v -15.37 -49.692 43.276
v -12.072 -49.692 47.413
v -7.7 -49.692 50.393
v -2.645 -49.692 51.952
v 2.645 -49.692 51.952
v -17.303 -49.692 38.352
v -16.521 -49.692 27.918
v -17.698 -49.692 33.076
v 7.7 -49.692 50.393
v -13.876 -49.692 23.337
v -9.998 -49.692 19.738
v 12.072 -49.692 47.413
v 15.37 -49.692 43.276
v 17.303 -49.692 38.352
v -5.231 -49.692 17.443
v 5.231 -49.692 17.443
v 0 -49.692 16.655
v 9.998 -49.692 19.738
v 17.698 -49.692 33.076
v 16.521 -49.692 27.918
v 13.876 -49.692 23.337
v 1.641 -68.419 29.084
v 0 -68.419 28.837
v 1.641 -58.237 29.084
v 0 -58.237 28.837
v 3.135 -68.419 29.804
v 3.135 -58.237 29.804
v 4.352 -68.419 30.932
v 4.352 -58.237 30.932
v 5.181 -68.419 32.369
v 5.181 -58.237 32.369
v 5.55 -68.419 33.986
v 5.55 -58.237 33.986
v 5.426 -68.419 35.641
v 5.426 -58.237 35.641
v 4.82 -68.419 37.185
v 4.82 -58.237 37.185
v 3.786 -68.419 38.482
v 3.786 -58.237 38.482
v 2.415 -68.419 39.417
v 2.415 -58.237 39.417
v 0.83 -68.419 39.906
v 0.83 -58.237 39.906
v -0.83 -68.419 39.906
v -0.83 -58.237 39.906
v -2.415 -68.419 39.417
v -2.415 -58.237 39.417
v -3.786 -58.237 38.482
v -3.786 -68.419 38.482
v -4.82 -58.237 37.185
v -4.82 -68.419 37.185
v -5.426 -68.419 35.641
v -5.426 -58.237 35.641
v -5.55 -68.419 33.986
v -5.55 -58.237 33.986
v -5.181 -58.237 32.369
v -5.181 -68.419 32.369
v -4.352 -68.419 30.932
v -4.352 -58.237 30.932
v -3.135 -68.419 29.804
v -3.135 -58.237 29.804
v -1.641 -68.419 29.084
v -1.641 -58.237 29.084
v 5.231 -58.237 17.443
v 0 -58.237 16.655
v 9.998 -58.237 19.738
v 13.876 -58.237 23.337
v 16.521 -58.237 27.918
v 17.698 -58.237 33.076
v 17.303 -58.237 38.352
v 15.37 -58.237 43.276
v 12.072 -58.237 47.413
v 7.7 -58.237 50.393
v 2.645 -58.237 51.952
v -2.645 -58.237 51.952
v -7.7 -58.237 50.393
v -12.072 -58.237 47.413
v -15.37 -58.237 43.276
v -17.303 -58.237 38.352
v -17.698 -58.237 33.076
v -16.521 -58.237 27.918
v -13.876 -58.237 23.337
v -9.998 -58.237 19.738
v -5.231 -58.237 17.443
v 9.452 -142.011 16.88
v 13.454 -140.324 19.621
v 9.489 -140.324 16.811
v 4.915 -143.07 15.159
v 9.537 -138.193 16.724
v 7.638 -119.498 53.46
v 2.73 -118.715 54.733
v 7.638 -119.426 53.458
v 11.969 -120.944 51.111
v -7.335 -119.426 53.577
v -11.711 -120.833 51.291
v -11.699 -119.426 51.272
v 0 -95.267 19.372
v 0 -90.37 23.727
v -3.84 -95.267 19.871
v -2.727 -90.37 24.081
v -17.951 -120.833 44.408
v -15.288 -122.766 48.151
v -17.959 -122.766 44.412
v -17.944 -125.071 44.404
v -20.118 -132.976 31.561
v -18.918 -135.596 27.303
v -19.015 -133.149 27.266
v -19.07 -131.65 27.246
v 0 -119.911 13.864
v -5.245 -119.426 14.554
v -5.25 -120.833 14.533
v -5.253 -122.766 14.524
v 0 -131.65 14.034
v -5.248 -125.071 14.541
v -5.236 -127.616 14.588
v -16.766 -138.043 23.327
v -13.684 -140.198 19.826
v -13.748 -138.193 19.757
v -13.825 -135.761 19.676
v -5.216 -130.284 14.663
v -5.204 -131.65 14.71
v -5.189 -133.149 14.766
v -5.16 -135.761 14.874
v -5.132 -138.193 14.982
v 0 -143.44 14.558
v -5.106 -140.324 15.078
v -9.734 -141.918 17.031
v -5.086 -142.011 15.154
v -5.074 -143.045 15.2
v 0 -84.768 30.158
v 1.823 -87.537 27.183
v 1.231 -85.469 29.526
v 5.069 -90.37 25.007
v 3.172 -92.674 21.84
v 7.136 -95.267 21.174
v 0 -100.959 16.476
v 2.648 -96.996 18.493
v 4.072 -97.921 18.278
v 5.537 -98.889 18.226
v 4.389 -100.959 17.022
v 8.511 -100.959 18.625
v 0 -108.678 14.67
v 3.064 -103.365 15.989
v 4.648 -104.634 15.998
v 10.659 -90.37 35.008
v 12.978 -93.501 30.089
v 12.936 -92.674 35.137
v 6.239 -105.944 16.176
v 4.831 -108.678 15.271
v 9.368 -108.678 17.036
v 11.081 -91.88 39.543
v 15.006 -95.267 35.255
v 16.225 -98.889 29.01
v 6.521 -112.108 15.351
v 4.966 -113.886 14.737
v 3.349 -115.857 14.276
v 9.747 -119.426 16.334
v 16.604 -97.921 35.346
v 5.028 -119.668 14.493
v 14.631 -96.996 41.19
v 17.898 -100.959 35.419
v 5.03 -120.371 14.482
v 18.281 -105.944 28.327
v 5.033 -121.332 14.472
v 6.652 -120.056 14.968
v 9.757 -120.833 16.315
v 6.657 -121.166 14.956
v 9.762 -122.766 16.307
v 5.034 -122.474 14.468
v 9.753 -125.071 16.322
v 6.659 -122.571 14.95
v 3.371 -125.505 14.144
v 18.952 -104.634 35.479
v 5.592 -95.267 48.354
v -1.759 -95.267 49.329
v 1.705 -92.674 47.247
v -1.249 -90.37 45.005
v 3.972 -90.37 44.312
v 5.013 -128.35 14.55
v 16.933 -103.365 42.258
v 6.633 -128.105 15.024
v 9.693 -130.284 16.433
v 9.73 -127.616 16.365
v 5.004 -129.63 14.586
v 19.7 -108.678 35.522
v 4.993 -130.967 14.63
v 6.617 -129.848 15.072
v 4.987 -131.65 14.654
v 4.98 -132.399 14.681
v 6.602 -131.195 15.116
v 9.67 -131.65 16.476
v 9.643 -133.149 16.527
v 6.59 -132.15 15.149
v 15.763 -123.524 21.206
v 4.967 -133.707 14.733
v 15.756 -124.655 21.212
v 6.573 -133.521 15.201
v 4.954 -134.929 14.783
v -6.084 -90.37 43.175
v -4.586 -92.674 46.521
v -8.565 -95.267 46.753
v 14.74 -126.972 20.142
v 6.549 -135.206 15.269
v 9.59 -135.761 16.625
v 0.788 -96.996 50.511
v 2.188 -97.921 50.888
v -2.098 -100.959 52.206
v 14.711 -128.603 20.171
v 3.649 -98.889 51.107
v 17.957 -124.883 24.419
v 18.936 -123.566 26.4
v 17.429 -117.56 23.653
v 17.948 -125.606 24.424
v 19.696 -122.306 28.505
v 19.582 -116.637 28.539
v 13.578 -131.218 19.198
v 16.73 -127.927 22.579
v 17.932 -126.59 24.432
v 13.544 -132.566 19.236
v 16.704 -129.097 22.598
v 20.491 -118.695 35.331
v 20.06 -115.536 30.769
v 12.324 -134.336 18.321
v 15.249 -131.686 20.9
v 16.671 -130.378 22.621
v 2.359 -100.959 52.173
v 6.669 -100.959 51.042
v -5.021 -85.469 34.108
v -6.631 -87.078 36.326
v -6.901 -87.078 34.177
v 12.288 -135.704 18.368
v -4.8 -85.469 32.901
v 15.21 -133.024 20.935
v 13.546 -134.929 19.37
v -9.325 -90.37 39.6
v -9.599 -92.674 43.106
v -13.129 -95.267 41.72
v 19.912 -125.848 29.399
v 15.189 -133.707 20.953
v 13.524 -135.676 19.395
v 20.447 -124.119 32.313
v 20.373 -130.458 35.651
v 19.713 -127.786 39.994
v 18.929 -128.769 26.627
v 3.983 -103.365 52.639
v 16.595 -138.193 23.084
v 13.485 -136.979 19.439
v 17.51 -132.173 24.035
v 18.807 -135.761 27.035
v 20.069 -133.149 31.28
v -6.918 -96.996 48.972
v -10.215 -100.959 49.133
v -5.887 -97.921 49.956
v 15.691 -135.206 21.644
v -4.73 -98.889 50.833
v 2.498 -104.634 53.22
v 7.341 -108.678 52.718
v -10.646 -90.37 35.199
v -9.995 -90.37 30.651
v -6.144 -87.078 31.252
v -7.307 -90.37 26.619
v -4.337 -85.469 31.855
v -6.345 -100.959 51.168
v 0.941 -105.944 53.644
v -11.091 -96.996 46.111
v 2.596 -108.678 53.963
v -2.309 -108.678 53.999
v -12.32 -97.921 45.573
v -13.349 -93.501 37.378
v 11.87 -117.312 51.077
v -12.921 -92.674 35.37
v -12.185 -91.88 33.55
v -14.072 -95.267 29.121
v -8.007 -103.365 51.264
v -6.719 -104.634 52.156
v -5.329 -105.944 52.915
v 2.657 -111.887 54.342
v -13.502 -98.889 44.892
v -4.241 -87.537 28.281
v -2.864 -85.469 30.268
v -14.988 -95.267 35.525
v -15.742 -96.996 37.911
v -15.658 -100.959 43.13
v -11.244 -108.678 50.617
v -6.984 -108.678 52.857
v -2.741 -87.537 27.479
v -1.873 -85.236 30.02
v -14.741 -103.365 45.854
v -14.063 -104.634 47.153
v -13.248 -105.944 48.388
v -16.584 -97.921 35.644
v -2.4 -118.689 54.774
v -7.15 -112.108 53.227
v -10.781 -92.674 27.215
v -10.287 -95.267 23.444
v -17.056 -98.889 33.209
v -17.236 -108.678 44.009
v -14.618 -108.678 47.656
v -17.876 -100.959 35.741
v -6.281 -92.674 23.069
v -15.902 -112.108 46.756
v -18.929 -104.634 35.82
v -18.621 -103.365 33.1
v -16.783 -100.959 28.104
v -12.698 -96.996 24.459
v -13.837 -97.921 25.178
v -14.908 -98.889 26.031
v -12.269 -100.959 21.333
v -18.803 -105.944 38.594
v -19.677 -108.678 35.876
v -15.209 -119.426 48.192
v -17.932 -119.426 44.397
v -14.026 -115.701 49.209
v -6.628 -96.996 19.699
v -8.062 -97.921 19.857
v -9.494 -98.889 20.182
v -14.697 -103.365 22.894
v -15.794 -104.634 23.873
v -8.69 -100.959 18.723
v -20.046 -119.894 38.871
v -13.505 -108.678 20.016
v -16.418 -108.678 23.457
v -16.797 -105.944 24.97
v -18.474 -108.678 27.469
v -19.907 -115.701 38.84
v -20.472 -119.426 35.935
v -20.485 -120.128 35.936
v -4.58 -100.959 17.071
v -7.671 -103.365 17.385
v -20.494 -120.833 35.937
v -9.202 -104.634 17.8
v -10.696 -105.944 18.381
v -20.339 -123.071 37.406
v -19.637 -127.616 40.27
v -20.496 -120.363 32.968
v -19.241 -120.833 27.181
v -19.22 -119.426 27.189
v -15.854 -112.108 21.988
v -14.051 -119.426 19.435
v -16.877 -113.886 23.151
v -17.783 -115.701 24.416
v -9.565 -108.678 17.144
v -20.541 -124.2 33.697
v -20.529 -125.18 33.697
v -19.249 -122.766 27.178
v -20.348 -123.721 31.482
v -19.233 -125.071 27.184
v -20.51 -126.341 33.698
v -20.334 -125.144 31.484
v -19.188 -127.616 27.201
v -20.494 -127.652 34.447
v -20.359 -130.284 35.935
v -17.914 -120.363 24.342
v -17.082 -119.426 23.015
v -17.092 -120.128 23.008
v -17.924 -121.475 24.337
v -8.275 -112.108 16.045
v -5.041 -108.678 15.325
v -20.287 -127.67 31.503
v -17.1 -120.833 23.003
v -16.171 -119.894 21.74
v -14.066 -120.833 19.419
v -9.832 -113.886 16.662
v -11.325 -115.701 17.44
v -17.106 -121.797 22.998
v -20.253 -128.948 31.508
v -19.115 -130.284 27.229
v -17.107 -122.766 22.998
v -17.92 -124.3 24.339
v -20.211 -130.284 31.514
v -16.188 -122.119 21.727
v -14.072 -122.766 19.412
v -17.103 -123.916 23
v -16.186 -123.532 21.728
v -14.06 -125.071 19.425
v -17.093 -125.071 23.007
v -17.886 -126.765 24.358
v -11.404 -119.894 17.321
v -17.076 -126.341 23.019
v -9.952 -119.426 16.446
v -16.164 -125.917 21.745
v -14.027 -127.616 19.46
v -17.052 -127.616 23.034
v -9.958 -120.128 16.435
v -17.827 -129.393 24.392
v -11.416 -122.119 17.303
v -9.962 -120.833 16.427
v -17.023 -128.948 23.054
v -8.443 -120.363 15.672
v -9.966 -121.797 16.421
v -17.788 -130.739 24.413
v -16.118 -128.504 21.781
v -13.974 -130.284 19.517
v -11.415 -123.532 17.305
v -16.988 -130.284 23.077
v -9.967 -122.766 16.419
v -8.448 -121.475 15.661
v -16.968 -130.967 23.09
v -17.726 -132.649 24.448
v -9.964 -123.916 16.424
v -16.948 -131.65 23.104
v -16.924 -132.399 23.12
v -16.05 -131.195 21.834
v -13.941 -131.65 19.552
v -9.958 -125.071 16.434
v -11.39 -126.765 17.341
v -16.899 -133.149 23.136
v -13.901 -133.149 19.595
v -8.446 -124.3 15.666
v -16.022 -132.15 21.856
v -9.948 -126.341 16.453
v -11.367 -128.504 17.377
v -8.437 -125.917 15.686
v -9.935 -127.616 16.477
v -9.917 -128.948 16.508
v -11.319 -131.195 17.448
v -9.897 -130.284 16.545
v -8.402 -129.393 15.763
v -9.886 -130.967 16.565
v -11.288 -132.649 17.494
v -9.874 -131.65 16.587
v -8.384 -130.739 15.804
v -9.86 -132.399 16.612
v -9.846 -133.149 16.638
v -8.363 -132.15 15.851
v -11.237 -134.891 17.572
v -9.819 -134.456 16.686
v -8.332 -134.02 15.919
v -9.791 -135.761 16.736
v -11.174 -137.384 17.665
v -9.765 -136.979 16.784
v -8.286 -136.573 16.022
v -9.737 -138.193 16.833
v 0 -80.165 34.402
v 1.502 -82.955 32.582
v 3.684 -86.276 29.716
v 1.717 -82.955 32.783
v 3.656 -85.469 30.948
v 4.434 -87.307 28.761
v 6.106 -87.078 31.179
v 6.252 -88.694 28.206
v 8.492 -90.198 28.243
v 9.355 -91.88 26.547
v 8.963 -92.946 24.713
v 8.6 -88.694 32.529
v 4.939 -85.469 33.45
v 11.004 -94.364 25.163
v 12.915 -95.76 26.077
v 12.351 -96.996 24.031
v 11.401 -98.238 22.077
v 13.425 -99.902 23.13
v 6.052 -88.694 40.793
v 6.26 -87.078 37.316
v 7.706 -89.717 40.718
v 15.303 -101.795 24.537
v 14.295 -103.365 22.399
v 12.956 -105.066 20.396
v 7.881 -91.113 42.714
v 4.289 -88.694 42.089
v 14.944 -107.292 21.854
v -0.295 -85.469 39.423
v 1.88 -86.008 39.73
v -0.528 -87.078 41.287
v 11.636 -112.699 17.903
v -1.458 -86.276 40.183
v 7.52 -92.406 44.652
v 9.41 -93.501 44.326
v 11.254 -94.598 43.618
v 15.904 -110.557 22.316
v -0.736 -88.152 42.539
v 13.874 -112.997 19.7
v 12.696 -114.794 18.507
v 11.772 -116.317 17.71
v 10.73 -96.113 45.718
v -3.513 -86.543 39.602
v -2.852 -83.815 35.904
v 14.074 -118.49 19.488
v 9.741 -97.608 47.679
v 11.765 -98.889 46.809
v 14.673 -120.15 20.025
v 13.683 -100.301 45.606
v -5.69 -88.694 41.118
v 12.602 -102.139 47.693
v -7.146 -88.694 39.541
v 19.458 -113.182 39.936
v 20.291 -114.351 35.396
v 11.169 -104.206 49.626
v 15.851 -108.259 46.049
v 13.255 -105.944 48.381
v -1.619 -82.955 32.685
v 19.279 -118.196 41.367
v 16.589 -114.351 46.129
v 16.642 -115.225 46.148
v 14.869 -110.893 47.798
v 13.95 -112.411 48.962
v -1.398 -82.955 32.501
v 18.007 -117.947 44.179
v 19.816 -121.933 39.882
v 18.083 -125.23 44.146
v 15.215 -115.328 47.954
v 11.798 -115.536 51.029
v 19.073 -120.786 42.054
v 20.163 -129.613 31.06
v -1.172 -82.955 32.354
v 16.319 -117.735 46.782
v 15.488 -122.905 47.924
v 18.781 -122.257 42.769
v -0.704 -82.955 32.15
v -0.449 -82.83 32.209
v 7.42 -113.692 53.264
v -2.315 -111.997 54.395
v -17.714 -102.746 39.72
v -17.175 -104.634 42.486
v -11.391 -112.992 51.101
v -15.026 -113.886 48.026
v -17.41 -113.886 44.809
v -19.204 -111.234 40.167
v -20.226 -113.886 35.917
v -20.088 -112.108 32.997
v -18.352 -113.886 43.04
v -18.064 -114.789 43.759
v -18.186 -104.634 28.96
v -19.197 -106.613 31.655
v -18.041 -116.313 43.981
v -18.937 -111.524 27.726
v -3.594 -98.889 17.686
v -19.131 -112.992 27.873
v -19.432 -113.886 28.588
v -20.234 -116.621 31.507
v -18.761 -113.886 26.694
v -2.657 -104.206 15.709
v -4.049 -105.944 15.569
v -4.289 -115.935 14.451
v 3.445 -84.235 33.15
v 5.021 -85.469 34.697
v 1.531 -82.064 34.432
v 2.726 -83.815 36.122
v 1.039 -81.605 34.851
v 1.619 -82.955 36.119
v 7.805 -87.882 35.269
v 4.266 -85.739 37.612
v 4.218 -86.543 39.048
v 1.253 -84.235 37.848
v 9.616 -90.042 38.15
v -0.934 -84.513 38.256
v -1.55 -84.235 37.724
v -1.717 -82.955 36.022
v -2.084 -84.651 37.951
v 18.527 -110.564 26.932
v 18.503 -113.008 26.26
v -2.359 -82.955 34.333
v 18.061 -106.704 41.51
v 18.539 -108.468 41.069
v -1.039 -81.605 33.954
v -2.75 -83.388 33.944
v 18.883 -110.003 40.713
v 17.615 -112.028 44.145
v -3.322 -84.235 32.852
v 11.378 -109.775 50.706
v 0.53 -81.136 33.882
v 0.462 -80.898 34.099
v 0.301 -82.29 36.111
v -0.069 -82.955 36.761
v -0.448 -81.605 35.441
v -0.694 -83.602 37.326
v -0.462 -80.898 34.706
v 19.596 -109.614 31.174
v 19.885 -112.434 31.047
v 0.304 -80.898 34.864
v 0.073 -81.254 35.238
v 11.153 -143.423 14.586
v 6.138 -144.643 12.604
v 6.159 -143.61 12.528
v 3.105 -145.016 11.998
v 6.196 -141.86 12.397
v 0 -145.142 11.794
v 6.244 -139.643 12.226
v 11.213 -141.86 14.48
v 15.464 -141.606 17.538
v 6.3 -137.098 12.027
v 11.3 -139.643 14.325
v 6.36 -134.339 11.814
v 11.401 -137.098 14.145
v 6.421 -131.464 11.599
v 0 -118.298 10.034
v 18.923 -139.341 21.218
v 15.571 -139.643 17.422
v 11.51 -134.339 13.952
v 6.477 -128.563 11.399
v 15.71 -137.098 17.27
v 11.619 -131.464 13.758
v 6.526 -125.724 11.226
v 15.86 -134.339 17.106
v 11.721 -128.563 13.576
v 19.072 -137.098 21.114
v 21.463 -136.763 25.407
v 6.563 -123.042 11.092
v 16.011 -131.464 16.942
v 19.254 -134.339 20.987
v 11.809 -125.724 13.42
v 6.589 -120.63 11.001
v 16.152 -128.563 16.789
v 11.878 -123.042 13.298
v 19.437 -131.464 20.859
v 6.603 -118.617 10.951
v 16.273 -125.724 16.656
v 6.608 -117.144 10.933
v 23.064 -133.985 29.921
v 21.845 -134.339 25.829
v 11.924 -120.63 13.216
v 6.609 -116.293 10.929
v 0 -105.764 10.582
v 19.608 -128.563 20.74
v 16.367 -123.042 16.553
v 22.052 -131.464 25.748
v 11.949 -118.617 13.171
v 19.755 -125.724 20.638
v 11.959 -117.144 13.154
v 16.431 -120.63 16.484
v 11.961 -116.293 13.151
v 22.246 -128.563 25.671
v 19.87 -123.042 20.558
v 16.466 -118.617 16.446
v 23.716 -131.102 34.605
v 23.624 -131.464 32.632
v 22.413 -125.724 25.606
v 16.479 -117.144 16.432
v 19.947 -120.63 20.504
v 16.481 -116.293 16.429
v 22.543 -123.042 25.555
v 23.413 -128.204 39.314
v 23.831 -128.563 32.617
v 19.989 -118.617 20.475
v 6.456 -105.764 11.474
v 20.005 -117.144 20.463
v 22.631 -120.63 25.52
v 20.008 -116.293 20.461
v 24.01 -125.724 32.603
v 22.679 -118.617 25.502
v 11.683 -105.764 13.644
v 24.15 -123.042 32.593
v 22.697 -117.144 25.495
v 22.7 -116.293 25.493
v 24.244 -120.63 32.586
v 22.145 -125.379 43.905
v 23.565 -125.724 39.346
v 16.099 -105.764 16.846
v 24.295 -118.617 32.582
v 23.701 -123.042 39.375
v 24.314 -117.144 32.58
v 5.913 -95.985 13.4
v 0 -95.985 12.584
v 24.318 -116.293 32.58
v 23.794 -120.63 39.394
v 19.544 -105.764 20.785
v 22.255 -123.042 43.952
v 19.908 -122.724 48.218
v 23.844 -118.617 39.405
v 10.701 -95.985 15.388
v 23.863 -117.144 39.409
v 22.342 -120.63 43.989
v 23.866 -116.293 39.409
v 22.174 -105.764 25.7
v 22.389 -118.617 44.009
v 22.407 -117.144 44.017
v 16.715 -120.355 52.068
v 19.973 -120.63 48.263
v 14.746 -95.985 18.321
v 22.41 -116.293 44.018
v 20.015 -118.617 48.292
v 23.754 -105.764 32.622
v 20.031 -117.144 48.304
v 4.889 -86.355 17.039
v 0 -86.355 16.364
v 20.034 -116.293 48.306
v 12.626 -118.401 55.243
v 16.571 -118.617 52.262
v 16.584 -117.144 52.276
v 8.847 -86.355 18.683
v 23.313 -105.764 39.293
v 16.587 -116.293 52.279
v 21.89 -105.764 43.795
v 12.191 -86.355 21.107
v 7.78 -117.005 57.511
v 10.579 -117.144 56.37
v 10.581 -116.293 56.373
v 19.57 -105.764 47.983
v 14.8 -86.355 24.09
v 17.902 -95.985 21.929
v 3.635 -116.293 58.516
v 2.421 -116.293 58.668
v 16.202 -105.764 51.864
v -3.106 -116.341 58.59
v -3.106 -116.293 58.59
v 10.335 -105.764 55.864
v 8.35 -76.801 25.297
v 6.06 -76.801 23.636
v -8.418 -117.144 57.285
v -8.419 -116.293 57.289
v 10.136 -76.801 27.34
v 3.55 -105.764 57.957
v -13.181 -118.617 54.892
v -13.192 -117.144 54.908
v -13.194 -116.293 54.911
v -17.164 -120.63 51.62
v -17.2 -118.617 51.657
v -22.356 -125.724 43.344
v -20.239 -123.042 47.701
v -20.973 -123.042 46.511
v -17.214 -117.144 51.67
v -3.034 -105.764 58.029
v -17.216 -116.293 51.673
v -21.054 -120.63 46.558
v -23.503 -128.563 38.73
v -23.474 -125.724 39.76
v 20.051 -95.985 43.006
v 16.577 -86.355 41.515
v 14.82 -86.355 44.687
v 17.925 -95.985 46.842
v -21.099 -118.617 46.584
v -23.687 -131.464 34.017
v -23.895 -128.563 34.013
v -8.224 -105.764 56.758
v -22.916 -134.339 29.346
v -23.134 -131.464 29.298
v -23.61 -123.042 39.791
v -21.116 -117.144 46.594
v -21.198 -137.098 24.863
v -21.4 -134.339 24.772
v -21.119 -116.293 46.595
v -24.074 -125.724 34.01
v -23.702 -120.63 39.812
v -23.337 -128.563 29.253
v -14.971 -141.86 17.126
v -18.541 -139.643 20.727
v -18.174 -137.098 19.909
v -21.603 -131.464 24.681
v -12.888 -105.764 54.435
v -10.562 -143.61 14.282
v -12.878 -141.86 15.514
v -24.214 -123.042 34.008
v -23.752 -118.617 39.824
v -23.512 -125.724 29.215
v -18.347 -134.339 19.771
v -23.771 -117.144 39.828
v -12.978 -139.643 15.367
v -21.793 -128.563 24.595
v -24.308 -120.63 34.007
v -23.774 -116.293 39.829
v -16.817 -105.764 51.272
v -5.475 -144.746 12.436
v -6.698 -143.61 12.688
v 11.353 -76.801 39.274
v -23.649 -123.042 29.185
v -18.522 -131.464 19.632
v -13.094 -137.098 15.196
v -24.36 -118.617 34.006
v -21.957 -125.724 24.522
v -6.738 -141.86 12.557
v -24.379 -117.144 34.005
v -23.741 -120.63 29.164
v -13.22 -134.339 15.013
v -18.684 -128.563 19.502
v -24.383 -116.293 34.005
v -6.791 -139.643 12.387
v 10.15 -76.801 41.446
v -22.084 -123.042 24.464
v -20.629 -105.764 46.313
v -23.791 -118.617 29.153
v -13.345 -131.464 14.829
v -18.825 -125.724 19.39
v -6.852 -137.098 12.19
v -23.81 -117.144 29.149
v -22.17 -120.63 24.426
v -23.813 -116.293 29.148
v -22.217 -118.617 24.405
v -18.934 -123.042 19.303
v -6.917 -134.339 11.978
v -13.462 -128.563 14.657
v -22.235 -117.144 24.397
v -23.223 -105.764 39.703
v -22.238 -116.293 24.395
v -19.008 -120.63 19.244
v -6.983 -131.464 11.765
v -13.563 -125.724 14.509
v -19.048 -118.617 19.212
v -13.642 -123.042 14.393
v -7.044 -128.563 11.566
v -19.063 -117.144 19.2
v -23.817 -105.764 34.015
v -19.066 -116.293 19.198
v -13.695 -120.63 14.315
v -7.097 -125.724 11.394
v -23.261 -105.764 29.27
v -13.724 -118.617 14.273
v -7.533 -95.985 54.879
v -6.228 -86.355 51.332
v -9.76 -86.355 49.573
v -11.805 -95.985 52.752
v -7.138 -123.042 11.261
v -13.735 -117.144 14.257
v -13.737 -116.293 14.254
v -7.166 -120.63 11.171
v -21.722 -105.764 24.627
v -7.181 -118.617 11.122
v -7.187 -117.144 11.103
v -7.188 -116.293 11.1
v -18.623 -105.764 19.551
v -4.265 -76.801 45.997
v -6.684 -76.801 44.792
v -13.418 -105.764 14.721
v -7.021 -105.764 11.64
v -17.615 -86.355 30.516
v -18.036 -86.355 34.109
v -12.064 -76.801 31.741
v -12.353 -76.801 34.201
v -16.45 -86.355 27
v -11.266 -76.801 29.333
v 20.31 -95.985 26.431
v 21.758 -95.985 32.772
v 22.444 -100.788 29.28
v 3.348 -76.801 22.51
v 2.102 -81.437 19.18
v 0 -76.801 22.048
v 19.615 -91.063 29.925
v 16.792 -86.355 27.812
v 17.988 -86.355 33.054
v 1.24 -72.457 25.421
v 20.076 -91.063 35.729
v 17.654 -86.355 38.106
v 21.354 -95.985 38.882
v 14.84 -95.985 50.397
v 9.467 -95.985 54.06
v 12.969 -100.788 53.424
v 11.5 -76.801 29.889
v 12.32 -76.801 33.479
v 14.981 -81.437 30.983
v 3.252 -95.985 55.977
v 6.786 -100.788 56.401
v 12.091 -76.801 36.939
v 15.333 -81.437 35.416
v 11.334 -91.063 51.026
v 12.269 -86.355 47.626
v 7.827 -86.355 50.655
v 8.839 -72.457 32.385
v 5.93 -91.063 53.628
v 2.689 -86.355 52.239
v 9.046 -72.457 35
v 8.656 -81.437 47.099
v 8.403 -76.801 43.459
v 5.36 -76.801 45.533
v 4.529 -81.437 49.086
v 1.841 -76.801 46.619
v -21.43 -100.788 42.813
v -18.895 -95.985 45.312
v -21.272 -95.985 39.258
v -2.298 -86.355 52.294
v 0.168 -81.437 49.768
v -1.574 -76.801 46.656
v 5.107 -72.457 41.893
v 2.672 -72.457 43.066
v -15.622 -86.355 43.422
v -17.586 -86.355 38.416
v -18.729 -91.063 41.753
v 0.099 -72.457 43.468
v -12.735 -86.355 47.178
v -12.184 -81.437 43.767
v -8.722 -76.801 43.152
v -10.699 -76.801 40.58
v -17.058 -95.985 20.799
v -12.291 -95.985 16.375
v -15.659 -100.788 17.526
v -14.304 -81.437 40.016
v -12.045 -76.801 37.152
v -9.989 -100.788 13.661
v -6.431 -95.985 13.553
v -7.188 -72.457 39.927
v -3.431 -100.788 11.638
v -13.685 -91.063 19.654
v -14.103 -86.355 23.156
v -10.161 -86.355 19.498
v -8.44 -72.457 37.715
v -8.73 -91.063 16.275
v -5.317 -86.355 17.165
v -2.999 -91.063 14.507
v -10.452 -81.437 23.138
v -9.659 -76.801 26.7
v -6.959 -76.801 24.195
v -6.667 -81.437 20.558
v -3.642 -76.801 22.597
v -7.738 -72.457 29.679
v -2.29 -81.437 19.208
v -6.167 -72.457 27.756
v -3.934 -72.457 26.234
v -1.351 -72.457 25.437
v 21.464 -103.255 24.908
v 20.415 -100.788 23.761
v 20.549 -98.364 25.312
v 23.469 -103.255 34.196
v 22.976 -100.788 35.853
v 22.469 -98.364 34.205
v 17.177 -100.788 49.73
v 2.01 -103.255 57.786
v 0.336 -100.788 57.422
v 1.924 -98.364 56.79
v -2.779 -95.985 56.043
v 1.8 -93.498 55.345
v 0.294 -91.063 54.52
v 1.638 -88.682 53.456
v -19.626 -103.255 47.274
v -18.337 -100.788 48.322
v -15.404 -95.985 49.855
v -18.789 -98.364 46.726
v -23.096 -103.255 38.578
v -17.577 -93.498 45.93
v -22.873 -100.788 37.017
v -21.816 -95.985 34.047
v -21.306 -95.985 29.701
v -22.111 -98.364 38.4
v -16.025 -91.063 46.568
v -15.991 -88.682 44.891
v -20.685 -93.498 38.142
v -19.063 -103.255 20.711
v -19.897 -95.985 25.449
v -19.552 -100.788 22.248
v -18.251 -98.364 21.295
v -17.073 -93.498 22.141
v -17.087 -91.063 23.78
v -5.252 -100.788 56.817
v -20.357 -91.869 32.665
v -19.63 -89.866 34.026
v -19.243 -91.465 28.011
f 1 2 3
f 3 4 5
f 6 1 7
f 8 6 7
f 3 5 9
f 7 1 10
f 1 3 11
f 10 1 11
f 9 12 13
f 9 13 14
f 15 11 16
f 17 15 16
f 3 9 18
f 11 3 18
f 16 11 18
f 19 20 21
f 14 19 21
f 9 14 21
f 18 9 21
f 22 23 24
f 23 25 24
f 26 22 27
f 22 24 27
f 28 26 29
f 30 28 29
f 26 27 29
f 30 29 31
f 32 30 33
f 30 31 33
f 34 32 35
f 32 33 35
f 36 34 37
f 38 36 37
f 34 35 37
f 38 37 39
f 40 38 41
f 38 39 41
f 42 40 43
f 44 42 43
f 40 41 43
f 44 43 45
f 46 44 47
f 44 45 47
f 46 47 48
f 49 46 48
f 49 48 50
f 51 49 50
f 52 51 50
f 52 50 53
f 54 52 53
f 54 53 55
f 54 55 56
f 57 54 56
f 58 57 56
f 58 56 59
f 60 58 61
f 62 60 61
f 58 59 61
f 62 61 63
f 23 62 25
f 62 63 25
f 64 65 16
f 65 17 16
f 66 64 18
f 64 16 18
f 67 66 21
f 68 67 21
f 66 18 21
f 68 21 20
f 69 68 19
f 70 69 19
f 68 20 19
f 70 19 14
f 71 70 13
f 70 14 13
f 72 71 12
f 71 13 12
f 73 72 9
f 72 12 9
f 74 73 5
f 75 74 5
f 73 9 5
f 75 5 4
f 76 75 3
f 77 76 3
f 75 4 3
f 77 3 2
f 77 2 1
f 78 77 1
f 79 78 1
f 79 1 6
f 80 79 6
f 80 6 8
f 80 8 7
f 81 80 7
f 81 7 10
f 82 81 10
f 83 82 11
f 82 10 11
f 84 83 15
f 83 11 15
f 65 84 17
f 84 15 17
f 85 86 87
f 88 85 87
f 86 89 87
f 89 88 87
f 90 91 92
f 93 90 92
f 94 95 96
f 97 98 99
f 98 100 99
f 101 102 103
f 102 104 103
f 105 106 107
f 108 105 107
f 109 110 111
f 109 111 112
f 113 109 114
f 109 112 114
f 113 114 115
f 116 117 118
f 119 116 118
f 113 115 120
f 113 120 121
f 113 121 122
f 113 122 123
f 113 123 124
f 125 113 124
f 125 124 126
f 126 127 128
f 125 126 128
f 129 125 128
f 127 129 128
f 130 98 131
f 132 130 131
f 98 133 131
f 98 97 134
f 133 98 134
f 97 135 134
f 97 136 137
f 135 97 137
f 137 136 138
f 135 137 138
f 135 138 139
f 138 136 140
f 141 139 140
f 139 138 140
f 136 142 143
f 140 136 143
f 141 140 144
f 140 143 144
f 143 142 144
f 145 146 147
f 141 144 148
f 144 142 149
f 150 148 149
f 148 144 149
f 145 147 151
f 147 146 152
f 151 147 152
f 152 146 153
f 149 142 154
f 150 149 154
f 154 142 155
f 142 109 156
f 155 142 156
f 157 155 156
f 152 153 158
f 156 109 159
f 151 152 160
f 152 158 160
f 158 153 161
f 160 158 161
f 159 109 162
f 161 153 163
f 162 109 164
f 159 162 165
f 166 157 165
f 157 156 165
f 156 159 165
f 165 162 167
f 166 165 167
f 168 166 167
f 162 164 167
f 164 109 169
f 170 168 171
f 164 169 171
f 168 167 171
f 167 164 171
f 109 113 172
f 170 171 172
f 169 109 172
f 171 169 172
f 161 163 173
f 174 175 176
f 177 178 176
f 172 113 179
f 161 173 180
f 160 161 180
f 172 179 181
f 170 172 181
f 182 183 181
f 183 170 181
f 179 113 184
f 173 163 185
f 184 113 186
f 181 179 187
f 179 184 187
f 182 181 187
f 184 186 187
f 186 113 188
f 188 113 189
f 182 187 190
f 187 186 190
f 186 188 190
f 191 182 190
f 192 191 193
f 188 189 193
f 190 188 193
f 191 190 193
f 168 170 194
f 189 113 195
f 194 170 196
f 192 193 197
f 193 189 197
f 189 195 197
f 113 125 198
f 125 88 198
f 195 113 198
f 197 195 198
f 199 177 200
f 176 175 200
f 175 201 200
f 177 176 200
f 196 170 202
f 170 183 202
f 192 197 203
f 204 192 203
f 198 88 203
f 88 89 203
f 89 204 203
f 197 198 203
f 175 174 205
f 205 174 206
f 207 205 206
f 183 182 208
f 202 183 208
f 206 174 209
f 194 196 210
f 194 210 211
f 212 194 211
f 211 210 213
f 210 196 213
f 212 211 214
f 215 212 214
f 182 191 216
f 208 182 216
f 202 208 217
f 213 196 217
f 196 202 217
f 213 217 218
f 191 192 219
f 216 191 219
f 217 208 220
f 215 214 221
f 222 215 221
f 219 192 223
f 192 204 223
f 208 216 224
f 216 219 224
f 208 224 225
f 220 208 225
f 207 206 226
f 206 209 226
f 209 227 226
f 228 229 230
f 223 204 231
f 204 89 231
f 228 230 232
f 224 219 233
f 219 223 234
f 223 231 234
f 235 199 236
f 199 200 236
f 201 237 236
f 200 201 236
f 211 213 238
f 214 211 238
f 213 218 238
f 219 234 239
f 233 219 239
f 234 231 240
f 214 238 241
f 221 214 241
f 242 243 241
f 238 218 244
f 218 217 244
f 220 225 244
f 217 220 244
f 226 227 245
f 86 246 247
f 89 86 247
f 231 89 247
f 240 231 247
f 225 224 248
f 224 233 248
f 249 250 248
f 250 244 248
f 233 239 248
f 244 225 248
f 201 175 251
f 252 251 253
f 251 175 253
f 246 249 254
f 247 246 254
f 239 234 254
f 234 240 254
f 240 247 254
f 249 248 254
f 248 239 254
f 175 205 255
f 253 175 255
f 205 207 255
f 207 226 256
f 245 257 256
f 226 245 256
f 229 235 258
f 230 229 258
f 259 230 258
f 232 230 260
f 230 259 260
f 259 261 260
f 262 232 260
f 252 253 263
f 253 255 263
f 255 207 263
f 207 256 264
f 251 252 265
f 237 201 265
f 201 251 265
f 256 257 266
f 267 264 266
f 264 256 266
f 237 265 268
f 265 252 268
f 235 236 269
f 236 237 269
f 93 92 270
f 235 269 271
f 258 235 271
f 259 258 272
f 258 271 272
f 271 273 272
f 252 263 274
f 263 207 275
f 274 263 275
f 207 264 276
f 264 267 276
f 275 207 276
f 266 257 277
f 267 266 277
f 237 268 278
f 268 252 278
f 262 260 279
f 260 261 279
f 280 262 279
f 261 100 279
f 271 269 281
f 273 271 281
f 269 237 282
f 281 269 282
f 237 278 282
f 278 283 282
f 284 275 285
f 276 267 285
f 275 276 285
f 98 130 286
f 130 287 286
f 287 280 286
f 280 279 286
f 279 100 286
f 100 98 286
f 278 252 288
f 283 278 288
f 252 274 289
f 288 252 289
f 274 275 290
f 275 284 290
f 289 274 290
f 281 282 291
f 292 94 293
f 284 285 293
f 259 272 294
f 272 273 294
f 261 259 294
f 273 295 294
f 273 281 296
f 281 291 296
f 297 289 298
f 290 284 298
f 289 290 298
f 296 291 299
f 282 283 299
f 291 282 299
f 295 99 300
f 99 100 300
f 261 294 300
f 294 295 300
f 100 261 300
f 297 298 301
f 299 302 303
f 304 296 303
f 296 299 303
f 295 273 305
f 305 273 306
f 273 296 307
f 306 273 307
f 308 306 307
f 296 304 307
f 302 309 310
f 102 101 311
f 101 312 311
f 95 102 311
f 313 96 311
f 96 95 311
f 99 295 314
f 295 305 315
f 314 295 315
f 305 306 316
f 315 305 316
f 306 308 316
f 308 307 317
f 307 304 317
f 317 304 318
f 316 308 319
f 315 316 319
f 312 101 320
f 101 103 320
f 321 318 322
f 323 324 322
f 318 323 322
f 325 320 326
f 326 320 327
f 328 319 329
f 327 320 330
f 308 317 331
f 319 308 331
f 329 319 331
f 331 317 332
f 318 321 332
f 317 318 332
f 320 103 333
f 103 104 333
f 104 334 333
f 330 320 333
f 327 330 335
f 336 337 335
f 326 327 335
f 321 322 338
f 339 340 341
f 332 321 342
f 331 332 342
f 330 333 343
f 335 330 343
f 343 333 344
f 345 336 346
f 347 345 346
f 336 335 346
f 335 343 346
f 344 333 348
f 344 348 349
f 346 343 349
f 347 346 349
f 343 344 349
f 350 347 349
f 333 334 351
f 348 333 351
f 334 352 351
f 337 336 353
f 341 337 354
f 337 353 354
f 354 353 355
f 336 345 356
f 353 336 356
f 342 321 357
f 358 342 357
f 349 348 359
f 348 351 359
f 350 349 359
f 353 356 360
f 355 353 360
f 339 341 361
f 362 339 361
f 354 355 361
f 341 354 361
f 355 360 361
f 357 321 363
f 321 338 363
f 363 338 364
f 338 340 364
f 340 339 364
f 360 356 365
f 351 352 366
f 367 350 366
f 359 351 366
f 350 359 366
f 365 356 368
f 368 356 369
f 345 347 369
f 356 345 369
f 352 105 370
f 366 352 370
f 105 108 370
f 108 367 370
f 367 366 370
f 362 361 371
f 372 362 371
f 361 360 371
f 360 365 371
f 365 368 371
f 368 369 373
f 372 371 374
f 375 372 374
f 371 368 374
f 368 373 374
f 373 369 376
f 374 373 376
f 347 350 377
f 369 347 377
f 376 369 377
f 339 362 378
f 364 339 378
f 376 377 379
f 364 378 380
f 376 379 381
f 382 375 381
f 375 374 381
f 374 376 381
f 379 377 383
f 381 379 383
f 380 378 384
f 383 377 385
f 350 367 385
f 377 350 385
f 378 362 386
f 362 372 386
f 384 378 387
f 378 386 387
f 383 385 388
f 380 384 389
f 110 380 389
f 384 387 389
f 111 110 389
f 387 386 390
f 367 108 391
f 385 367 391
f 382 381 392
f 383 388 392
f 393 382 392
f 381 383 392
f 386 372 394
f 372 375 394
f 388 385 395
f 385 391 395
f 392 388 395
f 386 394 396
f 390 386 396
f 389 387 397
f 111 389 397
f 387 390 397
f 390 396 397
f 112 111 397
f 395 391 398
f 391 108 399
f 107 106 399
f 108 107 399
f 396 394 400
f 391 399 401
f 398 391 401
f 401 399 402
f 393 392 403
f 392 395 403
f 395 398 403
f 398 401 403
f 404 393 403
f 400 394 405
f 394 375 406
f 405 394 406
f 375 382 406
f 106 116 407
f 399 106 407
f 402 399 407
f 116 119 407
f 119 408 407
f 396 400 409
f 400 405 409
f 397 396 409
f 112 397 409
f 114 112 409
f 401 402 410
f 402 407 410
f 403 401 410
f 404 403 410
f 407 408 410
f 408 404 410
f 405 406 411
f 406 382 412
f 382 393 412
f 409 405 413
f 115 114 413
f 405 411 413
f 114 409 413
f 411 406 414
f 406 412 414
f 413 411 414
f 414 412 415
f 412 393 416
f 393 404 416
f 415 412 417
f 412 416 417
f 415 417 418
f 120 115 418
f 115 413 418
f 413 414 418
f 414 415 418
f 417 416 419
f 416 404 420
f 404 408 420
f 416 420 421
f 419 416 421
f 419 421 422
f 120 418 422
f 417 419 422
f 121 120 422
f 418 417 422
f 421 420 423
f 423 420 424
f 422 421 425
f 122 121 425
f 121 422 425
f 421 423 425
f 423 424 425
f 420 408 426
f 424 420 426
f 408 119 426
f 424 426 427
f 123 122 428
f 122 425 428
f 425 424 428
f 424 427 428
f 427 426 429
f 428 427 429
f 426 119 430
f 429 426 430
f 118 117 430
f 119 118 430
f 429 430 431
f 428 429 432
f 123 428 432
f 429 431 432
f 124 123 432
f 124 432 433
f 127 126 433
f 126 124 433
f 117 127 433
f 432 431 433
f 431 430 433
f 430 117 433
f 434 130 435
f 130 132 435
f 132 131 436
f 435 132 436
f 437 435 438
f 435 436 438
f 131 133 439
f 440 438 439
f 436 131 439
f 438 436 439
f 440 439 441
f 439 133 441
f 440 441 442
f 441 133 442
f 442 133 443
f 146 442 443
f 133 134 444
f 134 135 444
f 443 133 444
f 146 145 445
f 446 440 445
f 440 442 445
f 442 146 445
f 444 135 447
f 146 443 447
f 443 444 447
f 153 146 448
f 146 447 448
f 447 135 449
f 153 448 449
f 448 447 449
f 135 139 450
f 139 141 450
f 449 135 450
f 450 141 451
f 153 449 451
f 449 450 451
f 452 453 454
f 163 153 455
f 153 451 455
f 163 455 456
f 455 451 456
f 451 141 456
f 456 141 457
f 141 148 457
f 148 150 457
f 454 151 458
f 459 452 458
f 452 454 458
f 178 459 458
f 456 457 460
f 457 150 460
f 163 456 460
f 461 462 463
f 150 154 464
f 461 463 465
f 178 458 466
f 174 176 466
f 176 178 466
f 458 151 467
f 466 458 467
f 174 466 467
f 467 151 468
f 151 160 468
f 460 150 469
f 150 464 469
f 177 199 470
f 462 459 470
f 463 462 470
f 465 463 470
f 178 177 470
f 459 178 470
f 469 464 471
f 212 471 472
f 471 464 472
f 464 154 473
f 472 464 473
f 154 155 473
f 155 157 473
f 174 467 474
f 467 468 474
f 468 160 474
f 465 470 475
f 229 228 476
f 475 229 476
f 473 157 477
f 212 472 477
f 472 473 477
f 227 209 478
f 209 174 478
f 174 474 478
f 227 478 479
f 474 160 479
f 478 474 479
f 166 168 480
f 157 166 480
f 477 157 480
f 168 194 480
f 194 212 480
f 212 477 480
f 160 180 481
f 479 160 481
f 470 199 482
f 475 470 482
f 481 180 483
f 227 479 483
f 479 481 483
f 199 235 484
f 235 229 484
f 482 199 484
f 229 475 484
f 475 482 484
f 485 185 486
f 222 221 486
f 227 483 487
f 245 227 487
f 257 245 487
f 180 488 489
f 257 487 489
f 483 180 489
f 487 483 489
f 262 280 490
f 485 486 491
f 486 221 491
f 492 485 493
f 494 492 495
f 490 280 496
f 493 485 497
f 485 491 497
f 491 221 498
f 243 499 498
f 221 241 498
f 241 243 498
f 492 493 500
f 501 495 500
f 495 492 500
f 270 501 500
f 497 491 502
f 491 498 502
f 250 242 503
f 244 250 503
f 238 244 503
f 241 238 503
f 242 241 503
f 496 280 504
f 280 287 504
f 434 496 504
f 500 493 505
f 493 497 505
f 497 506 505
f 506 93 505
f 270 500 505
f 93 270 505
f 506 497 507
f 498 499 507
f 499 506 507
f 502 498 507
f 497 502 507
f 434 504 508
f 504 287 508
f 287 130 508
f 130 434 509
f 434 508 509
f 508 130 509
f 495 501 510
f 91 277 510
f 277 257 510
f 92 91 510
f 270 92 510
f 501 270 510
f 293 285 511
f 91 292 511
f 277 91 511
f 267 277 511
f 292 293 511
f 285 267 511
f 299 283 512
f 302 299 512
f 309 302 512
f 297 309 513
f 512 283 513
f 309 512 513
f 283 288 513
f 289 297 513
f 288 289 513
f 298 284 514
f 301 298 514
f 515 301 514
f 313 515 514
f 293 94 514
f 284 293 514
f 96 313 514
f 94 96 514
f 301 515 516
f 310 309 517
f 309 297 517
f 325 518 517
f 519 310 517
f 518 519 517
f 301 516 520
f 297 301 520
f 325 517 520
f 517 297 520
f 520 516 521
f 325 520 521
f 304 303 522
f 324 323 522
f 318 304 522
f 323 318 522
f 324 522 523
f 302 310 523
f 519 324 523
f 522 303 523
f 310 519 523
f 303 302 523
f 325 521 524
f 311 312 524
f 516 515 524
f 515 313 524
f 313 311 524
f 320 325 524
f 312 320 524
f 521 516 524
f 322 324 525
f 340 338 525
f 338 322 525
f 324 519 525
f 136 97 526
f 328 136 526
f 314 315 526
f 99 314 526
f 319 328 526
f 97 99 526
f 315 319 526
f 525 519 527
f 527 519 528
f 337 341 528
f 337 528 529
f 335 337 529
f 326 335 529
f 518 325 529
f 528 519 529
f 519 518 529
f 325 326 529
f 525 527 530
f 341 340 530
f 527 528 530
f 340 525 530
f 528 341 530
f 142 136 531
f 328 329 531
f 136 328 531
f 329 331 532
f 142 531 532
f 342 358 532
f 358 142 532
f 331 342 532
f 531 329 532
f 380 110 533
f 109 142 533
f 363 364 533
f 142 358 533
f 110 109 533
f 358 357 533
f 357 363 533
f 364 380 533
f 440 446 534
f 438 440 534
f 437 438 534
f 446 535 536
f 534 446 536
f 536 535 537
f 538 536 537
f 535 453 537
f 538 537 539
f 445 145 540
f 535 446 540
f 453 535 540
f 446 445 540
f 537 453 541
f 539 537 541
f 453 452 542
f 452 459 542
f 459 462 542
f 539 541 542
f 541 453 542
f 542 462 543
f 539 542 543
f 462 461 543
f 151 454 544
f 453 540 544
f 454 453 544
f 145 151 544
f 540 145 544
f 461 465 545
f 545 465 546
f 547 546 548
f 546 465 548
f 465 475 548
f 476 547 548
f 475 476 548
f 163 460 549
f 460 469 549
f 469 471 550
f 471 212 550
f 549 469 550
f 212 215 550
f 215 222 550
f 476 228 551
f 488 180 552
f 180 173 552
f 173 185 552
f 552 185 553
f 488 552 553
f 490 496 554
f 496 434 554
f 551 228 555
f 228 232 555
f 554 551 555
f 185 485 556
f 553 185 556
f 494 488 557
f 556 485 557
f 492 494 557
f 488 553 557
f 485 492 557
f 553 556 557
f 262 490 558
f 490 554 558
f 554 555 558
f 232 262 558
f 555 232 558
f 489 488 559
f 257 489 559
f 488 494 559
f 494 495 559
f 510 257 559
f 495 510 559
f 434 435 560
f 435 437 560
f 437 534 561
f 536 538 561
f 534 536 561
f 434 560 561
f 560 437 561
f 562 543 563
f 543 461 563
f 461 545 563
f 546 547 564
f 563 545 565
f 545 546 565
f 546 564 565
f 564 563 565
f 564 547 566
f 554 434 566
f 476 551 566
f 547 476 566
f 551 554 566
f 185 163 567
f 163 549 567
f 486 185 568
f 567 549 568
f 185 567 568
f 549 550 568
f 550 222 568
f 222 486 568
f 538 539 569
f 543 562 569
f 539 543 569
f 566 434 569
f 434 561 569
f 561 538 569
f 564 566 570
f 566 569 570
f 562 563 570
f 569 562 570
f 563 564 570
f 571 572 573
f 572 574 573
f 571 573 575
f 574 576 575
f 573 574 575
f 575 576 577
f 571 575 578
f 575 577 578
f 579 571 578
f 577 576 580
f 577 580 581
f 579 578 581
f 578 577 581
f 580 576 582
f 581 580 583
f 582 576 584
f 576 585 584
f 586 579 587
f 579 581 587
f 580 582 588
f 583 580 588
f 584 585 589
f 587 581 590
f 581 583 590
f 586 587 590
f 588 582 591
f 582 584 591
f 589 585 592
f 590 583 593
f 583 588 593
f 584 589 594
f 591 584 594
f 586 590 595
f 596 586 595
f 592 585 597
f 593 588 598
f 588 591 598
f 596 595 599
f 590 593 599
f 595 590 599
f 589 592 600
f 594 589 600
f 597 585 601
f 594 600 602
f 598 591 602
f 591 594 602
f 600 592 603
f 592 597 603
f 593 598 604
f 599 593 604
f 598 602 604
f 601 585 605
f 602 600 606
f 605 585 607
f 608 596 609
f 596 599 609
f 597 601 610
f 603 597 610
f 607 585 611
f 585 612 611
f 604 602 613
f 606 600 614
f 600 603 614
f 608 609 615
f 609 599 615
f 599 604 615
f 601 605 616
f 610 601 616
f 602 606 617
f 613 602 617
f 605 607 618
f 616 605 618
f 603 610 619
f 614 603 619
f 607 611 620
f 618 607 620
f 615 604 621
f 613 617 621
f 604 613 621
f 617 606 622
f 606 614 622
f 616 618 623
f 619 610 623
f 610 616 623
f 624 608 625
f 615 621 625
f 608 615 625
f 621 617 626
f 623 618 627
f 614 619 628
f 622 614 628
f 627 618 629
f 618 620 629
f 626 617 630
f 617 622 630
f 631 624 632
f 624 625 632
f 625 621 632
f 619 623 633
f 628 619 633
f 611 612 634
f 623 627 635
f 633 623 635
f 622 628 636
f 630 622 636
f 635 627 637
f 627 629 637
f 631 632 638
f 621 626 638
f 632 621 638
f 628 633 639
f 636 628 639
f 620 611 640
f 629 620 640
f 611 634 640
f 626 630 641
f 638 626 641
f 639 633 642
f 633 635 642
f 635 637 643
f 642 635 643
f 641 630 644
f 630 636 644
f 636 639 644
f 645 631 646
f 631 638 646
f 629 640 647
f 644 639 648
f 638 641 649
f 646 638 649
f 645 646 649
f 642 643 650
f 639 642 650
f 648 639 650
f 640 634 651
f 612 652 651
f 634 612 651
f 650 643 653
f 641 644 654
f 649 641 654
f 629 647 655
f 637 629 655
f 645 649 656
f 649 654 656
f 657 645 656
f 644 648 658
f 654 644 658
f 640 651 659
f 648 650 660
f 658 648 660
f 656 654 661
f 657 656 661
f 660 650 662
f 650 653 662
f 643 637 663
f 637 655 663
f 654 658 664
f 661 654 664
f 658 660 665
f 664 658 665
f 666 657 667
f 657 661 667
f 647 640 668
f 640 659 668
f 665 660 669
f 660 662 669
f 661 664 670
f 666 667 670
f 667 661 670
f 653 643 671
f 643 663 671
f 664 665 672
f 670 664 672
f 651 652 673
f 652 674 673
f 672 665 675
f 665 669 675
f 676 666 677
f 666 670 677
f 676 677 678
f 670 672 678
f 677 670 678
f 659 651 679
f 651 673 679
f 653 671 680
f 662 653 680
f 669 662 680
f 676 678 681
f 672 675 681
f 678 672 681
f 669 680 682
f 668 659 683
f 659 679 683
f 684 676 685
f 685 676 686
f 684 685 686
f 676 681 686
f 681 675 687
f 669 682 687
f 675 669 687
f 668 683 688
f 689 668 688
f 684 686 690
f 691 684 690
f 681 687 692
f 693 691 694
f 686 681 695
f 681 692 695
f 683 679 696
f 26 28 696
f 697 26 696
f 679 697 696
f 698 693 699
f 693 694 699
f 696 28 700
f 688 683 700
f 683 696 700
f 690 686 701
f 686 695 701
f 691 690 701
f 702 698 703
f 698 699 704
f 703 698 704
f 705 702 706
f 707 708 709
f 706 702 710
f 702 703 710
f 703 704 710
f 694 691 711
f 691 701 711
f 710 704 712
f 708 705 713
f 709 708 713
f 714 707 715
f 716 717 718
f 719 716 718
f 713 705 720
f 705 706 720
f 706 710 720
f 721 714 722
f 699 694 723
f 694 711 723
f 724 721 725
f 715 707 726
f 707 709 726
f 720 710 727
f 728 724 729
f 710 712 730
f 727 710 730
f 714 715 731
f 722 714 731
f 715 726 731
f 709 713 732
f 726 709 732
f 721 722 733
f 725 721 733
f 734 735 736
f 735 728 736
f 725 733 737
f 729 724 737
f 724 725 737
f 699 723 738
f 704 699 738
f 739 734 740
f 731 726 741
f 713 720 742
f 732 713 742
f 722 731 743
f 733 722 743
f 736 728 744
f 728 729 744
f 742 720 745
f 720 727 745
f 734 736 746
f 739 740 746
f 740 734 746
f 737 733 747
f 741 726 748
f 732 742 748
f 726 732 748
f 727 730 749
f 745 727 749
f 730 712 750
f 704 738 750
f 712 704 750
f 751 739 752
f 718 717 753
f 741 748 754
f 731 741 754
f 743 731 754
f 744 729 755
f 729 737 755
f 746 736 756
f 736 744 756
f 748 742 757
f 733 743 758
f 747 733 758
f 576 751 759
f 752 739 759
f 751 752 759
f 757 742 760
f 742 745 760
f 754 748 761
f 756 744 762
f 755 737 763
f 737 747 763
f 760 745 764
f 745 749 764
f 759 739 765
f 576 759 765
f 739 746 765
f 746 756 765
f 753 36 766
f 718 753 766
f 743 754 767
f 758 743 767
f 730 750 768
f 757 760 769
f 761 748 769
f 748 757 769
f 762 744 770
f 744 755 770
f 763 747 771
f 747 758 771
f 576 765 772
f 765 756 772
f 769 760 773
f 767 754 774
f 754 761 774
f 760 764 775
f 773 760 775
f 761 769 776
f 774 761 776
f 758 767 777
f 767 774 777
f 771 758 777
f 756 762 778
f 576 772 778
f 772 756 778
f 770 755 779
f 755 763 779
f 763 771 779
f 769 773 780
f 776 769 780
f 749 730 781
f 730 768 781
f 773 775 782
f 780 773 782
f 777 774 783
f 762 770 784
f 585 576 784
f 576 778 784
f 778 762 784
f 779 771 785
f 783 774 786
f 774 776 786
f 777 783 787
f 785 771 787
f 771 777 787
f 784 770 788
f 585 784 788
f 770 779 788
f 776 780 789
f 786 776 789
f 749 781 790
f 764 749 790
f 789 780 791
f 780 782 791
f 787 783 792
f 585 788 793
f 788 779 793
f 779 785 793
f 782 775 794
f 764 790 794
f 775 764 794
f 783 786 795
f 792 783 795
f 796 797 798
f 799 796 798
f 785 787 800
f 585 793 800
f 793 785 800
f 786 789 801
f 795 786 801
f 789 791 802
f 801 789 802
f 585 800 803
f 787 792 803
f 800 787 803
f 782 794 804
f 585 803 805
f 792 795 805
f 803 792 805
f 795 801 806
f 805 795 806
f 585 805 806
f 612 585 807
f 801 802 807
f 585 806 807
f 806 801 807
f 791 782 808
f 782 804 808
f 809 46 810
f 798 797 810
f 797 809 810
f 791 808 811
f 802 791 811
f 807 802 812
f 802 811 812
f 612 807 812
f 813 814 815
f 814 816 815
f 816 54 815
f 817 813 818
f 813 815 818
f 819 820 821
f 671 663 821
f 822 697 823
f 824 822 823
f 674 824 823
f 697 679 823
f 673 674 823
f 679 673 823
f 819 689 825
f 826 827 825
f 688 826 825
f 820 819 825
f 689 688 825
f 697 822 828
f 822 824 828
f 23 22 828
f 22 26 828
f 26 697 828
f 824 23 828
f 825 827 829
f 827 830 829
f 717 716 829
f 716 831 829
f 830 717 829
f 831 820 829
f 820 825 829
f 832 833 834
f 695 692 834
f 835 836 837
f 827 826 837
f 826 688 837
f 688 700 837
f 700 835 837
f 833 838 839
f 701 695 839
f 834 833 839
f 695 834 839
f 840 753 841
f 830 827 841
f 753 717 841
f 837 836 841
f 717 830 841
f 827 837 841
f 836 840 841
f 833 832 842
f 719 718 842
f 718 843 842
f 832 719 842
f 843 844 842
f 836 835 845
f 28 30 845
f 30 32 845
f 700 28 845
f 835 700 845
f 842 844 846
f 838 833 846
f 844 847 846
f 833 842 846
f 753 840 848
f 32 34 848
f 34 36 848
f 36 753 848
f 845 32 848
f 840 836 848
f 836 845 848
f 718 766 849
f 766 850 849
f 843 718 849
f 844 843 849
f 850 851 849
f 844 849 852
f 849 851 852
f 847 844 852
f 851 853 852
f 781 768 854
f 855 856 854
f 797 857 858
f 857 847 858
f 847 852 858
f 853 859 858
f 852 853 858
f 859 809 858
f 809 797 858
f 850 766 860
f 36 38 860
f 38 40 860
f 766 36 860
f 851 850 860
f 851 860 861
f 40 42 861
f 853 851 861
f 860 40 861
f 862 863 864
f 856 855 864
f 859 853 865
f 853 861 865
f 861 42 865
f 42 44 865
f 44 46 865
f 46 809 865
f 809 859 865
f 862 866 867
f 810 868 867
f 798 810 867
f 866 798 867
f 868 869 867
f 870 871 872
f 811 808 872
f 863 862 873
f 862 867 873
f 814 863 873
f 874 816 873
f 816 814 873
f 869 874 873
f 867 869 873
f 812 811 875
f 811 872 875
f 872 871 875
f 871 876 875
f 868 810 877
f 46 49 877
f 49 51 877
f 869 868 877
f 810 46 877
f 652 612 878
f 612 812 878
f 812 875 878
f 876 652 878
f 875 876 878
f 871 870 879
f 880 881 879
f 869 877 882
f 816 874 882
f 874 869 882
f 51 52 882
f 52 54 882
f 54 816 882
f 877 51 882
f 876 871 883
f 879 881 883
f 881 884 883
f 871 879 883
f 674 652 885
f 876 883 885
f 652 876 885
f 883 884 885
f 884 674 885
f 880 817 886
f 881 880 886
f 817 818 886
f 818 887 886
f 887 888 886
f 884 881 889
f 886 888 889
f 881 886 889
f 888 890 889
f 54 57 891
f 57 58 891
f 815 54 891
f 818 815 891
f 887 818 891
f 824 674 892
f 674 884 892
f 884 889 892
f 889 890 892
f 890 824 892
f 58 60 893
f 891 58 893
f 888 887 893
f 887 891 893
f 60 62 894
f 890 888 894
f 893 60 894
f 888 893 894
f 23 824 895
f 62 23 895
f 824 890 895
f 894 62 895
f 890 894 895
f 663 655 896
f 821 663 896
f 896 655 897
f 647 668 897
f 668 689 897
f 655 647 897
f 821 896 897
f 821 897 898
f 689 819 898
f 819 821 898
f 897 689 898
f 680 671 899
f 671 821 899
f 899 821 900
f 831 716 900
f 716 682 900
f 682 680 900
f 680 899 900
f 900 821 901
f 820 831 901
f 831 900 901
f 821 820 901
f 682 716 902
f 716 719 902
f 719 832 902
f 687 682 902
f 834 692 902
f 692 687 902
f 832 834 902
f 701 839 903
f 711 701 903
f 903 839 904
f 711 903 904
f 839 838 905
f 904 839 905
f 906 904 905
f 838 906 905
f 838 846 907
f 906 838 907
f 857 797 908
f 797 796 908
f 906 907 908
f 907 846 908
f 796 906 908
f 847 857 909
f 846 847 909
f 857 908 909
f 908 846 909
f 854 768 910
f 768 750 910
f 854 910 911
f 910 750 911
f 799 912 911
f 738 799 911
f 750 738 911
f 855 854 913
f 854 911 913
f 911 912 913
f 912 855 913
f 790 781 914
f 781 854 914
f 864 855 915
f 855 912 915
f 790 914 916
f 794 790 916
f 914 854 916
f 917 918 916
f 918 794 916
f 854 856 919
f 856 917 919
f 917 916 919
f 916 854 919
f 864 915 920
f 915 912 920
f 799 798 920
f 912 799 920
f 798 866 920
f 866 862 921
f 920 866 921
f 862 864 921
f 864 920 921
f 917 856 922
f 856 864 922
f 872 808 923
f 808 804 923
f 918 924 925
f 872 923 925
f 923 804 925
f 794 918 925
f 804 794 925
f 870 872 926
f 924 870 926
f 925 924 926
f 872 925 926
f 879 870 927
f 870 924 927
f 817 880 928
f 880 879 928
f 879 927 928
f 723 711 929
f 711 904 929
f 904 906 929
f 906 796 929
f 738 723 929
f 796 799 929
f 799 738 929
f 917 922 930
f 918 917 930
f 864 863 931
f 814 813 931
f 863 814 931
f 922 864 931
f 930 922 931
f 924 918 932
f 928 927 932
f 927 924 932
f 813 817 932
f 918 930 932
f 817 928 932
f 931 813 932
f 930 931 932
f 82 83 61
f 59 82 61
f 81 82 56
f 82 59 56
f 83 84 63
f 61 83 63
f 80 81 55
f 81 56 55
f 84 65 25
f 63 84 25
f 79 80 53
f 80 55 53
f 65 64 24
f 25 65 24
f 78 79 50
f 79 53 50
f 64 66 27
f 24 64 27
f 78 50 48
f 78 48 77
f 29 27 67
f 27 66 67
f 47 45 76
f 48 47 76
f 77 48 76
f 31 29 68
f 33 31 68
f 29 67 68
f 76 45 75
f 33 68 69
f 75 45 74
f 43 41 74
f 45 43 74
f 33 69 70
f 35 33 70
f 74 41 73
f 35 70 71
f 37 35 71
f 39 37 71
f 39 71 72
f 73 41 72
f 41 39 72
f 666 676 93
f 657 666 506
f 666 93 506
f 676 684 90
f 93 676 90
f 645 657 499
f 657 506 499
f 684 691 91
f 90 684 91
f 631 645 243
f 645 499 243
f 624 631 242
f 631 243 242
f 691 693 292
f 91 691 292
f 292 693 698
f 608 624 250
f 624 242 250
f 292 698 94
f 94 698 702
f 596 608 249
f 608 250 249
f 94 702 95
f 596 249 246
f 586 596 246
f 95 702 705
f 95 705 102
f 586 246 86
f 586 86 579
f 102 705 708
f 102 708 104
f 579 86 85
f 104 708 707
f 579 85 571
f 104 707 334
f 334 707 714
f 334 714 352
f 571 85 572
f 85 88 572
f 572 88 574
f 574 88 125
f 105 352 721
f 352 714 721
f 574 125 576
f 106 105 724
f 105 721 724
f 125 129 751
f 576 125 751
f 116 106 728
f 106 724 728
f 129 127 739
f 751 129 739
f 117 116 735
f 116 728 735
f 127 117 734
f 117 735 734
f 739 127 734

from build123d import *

# Parameters (mm, degrees)
F0_W     = 69.4261547178
F0_H     = 65.1834458113
F1_DEPTH = 152.4
F3_DEPTH = 69.4271547178


with BuildPart() as f1:
    # F0 (on Front) → F1 (new body)
    with BuildSketch(Plane.XZ):
        with Locations((7.4568847194, 32.5917229056)):
            Rectangle(F0_W, F0_H)
    extrude(amount=F1_DEPTH)

    # F2 (on face) → F3 (cut, through all)
    with BuildSketch(Plane(origin=(-27.2561926395, 0, 0), x_dir=(0, -1, 0), z_dir=(-1, 0, 0))):
        Polygon((112.2826859355, 65.1834458113), (152.4, 0), (152.4, 65.1834458113), align=None)
    extrude(amount=-F3_DEPTH, mode=Mode.SUBTRACT)

    # F4 (on Right) → F5 (revolve, intersect)
    with BuildSketch(Plane.YZ):
        with BuildLine():
            Line((-152.5269150734, 14.8531086743), (-154.7763943672, 12.385875918))
            add(Edge.make_bspline(
                [(-154.7763943672, 12.385875918), (-134.720144085, 11.4751109665), (-101.5691193196, 5.5471128264), (-77.1250000497, 20.7958557616), (-68.4191435575, 28.8366228342)],
                knots=[0, 0, 0, 0, 0.5460678486, 1, 1, 1, 1], degree=3))
            Line((-68.4191435575, 28.8366228342), (-58.2371614873, 28.8366228342))
            Line((-58.2371614873, 28.8366228342), (-58.2371614873, 16.6546069086))
            Line((-58.2371614873, 16.6546069086), (-49.6915690601, 16.6546069086))
            Line((-49.6915690601, 16.6546069086), (-49.6915690601, 34.4024300575))
            Line((-49.6915690601, 34.4024300575), (-80.1647379994, 34.4024300575))
            add(Edge.make_bspline(
                [(-80.1647379994, 34.4024300575), (-86.7692198935, 29.6400485048), (-94.900823631, 9.4595479505), (-134.8687027442, 14.6084385283), (-152.5269150734, 14.8531086743)],
                knots=[0, 0, 0, 0, 0.4050358758, 1, 1, 1, 1], degree=3))
        make_face()
    revolve(axis=Axis((0, -71.1508684326, 34.4024300575), (0, -1, 0)), mode=Mode.INTERSECT)


solid = f1.part
